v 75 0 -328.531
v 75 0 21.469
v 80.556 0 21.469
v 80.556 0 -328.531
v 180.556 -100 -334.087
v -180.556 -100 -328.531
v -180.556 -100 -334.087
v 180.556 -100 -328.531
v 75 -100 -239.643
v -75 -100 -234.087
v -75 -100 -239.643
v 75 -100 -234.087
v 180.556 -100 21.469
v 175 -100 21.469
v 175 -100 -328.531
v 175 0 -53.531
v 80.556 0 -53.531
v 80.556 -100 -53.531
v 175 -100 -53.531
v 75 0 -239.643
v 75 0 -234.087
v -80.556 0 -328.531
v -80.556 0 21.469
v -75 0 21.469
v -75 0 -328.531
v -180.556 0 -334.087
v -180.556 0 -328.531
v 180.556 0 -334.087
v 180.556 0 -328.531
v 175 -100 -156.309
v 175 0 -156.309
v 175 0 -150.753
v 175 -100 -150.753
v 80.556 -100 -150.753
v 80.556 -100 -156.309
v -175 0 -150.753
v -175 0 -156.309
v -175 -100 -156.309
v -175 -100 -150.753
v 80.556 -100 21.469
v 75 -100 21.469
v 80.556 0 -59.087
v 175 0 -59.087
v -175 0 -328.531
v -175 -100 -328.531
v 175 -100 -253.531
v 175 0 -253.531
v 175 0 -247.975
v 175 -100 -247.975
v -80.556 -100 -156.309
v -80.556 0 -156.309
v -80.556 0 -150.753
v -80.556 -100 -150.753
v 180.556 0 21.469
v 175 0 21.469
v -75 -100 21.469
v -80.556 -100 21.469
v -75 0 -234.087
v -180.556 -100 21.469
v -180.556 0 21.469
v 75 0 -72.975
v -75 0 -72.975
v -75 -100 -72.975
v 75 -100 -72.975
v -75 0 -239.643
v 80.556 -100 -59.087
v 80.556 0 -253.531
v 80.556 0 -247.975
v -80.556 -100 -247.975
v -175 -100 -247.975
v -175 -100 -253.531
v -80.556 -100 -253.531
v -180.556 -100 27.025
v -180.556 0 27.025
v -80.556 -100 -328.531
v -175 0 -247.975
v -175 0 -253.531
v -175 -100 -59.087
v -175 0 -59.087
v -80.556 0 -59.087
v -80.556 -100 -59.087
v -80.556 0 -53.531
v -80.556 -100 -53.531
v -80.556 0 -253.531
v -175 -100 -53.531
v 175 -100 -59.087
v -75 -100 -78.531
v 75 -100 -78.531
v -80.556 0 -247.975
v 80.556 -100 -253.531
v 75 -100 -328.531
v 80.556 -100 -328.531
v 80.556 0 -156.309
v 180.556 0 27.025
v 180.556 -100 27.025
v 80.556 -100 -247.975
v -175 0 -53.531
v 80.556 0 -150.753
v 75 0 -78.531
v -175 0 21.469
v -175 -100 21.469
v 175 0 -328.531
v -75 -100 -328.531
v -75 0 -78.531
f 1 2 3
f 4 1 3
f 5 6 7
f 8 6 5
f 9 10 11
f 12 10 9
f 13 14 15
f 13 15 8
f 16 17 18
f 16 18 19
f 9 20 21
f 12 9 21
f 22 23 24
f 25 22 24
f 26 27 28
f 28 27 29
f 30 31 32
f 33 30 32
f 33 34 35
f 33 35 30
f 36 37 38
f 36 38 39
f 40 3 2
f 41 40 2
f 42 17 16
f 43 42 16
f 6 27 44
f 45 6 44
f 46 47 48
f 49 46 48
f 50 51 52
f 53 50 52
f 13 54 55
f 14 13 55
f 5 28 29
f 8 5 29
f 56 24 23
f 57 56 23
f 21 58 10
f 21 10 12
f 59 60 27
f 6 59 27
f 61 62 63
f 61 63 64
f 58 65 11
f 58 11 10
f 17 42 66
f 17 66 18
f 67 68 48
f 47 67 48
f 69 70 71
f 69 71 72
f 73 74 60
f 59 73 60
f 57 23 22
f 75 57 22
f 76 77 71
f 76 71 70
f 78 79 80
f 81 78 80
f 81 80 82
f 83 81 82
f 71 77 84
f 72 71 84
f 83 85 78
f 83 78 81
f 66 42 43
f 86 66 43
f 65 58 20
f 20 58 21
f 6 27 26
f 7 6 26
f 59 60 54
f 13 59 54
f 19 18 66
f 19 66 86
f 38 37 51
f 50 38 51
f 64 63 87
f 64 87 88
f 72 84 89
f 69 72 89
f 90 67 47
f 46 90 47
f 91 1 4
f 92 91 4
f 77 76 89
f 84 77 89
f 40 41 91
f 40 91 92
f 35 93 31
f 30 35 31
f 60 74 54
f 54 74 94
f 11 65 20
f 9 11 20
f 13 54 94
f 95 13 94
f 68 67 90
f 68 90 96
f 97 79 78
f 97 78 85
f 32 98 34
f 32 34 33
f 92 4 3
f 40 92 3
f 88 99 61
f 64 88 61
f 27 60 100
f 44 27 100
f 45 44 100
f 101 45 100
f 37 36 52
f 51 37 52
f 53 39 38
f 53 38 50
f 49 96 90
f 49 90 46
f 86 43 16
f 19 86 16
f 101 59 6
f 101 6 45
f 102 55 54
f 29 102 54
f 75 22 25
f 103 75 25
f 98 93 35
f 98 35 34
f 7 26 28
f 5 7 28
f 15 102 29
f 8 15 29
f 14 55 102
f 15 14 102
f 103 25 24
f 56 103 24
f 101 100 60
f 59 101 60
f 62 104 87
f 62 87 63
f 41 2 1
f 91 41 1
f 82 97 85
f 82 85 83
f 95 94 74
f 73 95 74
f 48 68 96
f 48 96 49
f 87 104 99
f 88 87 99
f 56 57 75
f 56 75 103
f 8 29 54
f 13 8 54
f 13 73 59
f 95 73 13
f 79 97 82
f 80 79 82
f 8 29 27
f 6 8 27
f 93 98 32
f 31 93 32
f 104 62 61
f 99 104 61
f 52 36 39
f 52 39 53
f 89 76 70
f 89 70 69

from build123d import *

# Parameters (mm, degrees)
F1_DEPTH = 100
F2_DEPTH = 100
F3_DEPTH = 100
F4_DEPTH = 100
F5_DEPTH = 100
F6_DEPTH = 100
F0_W     = 94.444
F0_H     = 5.556
F7_DEPTH = 100
F0_W_2   = 150


with BuildPart() as f1:
    # F0 (on Front) → F1 (new body)
    with BuildSketch(Plane.XZ):
        Polygon((-180.556, 21.4687940708), (-175, 21.4687940708), (-80.556, 21.4687940708), (-75, 21.4687940708), (75, 21.4687940708), (80.556, 21.4687940708), (175, 21.4687940708), (180.556, 21.4687940708), (180.556, 27.0247940708), (-180.556, 27.0247940708), align=None)
    extrude(amount=F1_DEPTH)


with BuildPart() as f2:
    # F0 (on Front) → F2 (new body)
    with BuildSketch(Plane.XZ):
        Polygon((-175, -328.5312059292), (-180.556, -328.5312059292), (-180.556, -334.0872059292), (180.556, -334.0872059292), (180.556, -328.5312059292), (175, -328.5312059292), (80.556, -328.5312059292), (75, -328.5312059292), (-75, -328.5312059292), (-80.556, -328.5312059292), align=None)
    extrude(amount=F2_DEPTH)


with BuildPart() as f3:
    # F0 (on Front) → F3 (new body)
    with BuildSketch(Plane.XZ):
        Polygon((180.556, -328.5312059292), (180.556, 21.4687940708), (175, 21.4687940708), (175, -53.5312059292), (175, -59.0872059292), (175, -150.7532059292), (175, -156.3092059292), (175, -247.9752059292), (175, -253.5312059292), (175, -328.5312059292), align=None)
    extrude(amount=F3_DEPTH)


with BuildPart() as f4:
    # F0 (on Front) → F4 (new body)
    with BuildSketch(Plane.XZ):
        Polygon((-175, -53.5312059292), (-175, 21.4687940708), (-180.556, 21.4687940708), (-180.556, -328.5312059292), (-175, -328.5312059292), (-175, -253.5312059292), (-175, -247.9752059292), (-175, -156.3092059292), (-175, -150.7532059292), (-175, -59.0872059292), align=None)
    extrude(amount=F4_DEPTH)


with BuildPart() as f5:
    # F0 (on Front) → F5 (new body)
    with BuildSketch(Plane.XZ):
        Polygon((-75, 21.4687940708), (-80.556, 21.4687940708), (-80.556, -53.5312059292), (-80.556, -59.0872059292), (-80.556, -150.7532059292), (-80.556, -156.3092059292), (-80.556, -247.9752059292), (-80.556, -253.5312059292), (-80.556, -328.5312059292), (-75, -328.5312059292), (-75, -239.6432062043), (-75, -234.0872062043), (-75, -78.5312056541), (-75, -72.9752056541), align=None)
    extrude(amount=F5_DEPTH)


with BuildPart() as f6:
    # F0 (on Front) → F6 (new body)
    with BuildSketch(Plane.XZ):
        Polygon((80.556, 21.4687940708), (75, 21.4687940708), (75, -72.9752056541), (75, -78.5312056541), (75, -234.0872062043), (75, -239.6432062043), (75, -328.5312059292), (80.556, -328.5312059292), (80.556, -253.5312059292), (80.556, -247.9752059292), (80.556, -156.3092059292), (80.556, -150.7532059292), (80.556, -59.0872059292), (80.556, -53.5312059292), align=None)
    extrude(amount=F6_DEPTH)


with BuildPart() as f7:
    # F0 (on Front) → F7 (new body)
    with BuildSketch(Plane.XZ):
        with Locations((-127.778, -56.3092059292)):
            Rectangle(F0_W, F0_H)
    extrude(amount=F7_DEPTH)


with BuildPart() as f7b:
    # F0 (on Front) → F7, piece 2 (new body)
    with BuildSketch(Plane.XZ):
        with Locations((-127.778, -153.5312059292)):
            Rectangle(F0_W, F0_H)
    extrude(amount=F7_DEPTH)


with BuildPart() as f7c:
    # F0 (on Front) → F7, piece 3 (new body)
    with BuildSketch(Plane.XZ):
        with Locations((-127.778, -250.7532059292)):
            Rectangle(F0_W, F0_H)
    extrude(amount=F7_DEPTH)


with BuildPart() as f7d:
    # F0 (on Front) → F7, piece 4 (new body)
    with BuildSketch(Plane.XZ):
        with Locations((0, -75.7532056541)):
            Rectangle(F0_W_2, F0_H)
    extrude(amount=F7_DEPTH)


with BuildPart() as f7e:
    # F0 (on Front) → F7, piece 5 (new body)
    with BuildSketch(Plane.XZ):
        with Locations((0, -236.8652062043)):
            Rectangle(F0_W_2, F0_H)
    extrude(amount=F7_DEPTH)


with BuildPart() as f7f:
    # F0 (on Front) → F7, piece 6 (new body)
    with BuildSketch(Plane.XZ):
        with Locations((127.778, -56.3092059292)):
            Rectangle(F0_W, F0_H)
    extrude(amount=F7_DEPTH)


with BuildPart() as f7g:
    # F0 (on Front) → F7, piece 7 (new body)
    with BuildSketch(Plane.XZ):
        with Locations((127.778, -153.5312059292)):
            Rectangle(F0_W, F0_H)
    extrude(amount=F7_DEPTH)


with BuildPart() as f7h:
    # F0 (on Front) → F7, piece 8 (new body)
    with BuildSketch(Plane.XZ):
        with Locations((127.778, -250.7532059292)):
            Rectangle(F0_W, F0_H)
    extrude(amount=F7_DEPTH)


solid = Compound([f1.part, f2.part, f3.part, f4.part, f5.part, f6.part, f7.part, f7b.part, f7c.part, f7d.part, f7e.part, f7f.part, f7g.part, f7h.part])
